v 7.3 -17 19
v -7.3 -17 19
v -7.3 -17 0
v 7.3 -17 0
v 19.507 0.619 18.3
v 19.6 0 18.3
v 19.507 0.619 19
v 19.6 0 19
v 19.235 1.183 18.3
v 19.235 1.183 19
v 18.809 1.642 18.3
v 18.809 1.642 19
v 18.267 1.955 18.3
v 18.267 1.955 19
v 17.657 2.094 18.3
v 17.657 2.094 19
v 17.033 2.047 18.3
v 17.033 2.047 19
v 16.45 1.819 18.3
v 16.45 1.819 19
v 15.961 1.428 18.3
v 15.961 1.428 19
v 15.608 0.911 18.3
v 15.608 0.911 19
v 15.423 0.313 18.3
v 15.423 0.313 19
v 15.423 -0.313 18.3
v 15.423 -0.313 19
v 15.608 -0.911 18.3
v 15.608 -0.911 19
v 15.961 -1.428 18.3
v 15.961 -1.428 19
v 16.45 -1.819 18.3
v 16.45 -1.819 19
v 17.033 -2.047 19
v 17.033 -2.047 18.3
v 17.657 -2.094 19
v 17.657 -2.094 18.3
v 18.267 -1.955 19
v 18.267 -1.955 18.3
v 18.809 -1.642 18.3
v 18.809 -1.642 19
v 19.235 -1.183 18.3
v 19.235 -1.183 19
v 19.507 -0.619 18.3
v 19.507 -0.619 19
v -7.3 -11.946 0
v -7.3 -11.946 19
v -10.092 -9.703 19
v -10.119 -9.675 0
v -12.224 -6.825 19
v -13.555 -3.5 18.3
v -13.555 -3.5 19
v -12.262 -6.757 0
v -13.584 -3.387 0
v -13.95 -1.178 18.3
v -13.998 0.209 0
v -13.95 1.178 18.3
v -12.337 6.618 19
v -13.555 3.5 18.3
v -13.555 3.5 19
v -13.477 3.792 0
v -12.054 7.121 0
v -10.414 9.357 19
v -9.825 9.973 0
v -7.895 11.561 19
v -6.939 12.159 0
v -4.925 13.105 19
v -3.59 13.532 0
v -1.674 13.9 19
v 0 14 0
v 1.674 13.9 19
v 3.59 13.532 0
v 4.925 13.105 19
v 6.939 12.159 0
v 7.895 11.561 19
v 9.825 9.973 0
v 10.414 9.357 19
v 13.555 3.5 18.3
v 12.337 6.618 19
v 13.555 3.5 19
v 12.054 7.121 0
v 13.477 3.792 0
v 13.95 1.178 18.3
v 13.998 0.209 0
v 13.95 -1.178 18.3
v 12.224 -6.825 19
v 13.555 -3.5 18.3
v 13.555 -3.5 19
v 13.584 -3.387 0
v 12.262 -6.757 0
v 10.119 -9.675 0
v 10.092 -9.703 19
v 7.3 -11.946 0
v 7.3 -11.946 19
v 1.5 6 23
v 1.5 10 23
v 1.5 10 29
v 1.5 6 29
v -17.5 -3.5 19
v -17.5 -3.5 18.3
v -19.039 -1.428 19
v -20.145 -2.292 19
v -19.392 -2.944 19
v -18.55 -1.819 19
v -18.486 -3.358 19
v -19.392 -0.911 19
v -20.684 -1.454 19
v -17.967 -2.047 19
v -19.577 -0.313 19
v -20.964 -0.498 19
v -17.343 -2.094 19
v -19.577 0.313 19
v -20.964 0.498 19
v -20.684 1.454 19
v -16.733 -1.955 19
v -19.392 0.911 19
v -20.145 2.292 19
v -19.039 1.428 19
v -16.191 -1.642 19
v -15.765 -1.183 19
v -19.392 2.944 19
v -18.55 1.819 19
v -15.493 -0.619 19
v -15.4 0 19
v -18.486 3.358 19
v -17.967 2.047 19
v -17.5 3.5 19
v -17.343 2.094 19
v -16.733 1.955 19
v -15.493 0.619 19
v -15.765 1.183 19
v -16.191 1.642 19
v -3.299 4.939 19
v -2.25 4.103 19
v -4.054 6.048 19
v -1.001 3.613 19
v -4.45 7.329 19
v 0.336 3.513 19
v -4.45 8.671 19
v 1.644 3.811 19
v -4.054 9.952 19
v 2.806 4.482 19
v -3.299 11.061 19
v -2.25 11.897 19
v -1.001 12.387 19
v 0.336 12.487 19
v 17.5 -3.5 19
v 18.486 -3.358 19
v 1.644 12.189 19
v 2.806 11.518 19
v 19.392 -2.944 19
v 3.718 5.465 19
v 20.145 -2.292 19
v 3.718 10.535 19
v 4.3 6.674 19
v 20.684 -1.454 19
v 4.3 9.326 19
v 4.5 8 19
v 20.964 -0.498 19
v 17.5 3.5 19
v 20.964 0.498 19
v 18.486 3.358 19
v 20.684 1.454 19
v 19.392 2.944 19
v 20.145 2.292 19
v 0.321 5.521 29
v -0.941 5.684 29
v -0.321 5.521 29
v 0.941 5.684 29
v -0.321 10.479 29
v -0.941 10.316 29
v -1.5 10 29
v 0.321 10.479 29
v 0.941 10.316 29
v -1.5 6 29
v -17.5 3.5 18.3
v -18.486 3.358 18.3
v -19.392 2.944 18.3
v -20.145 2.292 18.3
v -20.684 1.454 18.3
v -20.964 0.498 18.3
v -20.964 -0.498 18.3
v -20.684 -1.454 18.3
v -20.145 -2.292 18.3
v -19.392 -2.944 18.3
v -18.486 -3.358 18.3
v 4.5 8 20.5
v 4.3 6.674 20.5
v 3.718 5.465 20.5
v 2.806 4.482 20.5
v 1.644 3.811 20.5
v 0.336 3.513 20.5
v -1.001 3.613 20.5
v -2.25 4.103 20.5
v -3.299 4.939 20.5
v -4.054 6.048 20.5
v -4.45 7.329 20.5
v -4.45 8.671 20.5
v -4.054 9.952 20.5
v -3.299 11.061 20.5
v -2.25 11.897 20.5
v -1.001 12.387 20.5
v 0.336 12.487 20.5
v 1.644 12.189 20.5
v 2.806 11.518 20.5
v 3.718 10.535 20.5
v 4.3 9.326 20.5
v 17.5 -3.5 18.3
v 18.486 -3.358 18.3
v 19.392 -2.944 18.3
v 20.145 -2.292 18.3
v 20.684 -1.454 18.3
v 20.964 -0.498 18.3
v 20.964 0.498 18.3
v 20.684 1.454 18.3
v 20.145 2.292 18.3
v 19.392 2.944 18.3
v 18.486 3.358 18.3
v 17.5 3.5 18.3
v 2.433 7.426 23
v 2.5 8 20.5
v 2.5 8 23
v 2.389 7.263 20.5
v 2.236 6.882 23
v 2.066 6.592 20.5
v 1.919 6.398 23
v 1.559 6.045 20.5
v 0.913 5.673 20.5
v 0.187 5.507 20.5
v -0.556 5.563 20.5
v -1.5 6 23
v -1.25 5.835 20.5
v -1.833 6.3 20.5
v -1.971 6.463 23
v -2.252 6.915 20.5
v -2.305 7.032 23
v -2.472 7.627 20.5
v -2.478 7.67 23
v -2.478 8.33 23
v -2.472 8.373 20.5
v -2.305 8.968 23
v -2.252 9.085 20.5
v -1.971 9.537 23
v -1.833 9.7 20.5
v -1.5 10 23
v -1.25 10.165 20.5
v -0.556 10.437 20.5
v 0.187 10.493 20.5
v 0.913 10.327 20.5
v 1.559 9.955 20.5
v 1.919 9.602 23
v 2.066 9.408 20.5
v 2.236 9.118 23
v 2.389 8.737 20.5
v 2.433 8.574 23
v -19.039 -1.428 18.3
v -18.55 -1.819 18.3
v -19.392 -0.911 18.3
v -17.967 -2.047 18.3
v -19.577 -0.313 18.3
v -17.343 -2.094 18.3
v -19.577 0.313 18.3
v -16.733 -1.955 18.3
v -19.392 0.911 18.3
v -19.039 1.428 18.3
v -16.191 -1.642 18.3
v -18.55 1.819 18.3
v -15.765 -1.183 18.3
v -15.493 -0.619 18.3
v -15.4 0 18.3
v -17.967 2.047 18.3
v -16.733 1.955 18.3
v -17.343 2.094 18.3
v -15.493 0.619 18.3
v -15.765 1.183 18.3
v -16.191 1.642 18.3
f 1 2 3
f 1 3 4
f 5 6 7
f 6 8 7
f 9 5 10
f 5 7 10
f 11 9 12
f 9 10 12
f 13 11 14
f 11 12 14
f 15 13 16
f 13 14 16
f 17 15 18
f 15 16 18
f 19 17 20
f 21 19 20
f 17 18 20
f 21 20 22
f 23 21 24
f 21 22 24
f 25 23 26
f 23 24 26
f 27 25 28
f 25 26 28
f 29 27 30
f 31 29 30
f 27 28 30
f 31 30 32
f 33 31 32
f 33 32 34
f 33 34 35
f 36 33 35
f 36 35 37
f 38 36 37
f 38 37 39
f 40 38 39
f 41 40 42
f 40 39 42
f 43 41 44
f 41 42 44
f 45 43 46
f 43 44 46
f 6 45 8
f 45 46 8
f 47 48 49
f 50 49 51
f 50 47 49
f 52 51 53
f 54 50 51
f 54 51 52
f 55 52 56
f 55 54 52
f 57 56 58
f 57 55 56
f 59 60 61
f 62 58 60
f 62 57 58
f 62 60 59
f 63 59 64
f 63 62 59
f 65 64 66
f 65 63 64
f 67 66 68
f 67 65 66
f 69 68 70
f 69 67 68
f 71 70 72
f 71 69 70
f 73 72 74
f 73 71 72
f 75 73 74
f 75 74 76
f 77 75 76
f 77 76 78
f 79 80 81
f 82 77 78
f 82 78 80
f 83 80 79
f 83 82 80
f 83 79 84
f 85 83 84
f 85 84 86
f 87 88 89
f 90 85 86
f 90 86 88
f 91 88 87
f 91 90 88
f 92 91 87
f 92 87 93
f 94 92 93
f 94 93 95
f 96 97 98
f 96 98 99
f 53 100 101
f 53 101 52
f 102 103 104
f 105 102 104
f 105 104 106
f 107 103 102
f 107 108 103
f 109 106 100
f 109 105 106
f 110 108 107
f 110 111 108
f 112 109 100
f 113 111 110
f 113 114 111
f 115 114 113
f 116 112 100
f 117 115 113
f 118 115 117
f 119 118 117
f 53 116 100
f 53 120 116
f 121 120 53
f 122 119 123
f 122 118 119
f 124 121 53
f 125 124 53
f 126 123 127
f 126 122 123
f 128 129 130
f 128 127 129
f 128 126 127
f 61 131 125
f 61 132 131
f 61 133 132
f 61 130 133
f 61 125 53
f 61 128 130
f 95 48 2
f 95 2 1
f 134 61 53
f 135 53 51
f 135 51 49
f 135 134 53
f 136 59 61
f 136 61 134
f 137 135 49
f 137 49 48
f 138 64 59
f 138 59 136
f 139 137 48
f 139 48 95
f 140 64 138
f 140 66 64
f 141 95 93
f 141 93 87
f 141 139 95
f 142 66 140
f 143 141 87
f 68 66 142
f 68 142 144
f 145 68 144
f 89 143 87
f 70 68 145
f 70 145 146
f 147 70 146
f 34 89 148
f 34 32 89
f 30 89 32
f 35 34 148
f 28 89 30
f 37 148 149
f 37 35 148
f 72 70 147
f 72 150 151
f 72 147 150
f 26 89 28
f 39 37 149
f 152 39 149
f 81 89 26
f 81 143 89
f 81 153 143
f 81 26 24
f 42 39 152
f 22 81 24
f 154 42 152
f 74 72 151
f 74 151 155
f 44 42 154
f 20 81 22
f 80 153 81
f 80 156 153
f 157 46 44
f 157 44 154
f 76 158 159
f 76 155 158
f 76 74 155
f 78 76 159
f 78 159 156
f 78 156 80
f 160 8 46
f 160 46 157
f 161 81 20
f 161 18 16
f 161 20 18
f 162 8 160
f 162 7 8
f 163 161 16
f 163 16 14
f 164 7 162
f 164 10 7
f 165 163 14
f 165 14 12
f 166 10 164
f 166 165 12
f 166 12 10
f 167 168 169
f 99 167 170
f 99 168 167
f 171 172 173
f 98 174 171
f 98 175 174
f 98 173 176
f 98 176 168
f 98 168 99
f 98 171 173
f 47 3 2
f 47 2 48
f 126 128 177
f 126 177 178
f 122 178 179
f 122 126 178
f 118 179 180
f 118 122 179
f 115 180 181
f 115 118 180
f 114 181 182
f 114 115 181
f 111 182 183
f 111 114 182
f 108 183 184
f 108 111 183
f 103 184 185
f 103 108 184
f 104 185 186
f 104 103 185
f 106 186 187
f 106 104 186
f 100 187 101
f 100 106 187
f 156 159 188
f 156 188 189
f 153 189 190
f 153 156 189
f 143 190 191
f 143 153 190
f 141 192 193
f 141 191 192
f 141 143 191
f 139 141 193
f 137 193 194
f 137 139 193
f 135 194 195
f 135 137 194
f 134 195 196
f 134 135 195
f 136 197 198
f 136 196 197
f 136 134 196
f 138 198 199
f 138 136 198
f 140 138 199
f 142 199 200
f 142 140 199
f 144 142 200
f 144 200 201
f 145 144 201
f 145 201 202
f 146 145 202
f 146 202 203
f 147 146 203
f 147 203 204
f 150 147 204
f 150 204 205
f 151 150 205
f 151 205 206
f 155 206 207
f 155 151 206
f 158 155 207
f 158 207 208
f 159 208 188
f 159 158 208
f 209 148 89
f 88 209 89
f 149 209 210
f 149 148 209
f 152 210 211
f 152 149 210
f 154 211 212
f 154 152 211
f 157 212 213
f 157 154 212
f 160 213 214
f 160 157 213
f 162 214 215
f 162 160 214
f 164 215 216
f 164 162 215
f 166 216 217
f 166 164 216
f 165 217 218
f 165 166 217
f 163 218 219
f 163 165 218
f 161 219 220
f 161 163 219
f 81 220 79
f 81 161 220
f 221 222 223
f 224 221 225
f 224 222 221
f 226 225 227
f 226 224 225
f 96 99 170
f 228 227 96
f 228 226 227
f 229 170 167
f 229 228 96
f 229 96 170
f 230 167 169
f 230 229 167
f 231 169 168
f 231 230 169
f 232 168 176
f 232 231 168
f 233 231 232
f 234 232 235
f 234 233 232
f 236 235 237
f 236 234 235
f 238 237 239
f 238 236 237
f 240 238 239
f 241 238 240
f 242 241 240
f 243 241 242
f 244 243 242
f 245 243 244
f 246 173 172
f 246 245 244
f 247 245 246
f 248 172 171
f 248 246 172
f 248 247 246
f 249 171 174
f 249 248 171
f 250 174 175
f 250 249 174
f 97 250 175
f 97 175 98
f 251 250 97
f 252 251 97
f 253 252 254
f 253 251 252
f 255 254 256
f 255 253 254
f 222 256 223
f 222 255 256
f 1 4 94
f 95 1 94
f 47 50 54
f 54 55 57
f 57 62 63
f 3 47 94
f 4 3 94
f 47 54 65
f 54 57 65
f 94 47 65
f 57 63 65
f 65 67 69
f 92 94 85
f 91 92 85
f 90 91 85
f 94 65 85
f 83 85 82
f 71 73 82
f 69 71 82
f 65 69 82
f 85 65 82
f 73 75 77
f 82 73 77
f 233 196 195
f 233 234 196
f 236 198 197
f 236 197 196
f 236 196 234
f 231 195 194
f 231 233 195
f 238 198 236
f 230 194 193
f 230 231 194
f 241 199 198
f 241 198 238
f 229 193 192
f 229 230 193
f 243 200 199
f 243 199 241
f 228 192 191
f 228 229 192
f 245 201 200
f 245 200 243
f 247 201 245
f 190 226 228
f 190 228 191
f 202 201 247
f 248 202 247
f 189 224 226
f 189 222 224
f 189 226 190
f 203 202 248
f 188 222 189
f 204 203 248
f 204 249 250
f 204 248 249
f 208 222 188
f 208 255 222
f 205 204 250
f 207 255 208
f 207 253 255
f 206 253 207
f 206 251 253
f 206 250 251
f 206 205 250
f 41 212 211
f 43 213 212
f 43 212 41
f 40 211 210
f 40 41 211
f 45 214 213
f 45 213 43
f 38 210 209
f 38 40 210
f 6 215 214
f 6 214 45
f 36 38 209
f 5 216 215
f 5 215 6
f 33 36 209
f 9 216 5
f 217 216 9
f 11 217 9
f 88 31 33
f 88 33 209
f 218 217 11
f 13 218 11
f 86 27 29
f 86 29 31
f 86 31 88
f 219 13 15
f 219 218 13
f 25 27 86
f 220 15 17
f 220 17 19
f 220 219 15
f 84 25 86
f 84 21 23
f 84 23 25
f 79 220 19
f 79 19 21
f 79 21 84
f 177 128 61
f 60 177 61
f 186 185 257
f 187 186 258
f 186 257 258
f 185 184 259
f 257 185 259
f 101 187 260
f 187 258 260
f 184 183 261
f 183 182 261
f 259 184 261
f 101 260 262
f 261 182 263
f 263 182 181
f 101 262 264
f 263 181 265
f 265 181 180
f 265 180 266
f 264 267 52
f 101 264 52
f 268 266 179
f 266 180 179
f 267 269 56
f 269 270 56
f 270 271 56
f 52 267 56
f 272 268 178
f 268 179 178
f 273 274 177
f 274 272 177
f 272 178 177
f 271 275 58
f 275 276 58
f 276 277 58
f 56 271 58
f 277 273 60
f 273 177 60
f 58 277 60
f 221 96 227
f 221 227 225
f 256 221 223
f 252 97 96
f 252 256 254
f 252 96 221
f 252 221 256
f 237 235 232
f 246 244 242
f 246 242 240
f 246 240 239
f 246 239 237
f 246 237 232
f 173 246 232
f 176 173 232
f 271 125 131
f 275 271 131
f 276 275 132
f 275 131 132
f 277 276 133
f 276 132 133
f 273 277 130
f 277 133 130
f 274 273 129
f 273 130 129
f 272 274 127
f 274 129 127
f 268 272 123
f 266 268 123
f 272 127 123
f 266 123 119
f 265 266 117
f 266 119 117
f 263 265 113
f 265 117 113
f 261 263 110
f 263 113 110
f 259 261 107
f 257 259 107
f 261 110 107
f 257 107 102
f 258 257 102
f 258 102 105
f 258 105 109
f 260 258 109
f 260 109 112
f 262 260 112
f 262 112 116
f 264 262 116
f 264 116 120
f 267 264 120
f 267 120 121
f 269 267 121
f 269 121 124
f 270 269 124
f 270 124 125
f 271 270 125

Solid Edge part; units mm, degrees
sketch "Sketch1" plane through (0, 0, 0) normal (0, 0, 1) x (1, 0, 0)
  circle A0 centre (0, 0) radius 14
extrude "Protrusion1" add sketch "Sketch1" along normal blind 19
sketch "Sketch2" plane through (0, 0, 19) normal (0, 0, 1) x (1, 0, 0)
  line L0 (-17.5, -3.5) -> (-13.5554, -3.5)
  arc A0 (-13.5554, -3.5) -> (-13.5554, 3.5) centre (0, 0) cw
  line L1 (-17.5, 3.5) -> (-13.5554, 3.5)
  arc A1 (-17.5, -3.5) -> (-17.5, 3.5) centre (-17.5, 0) cw
  circle A2 centre (-17.5, 0) radius 2.1
  circle A3 centre (17.5, 0) radius 2.1
  line L2 (17.5, -3.5) -> (13.5554, -3.5)
  line L3 (17.5, 3.5) -> (13.5554, 3.5)
  arc A4 (17.5, 3.5) -> (17.5, -3.5) centre (17.5, 0) cw
  arc A5 (13.5554, 3.5) -> (13.5554, -3.5) centre (0, 0) cw
extrude "ExtrudedProtrusion_2" add sketch "Sketch2" against normal blind 0.7
sketch "Sketch3" plane through (0, 0, 19) normal (0, 0, 1) x (1, 0, 0)
  circle A0 centre (0, 8) radius 4.5
extrude "ExtrudedProtrusion_3" add sketch "Sketch3" along normal blind 1.5
sketch "Sketch4" plane through (0, 8, 20.5) normal (0, 0, 1) x (1, 0, 0)
  circle A0 centre (0, 0) radius 2.5
extrude "ExtrudedProtrusion_4" add sketch "Sketch4" along normal blind 2.5
sketch "Sketch5" plane through (0, 8, 23) normal (0, 0, 1) x (1, 0, 0)
  line L0 (-1.5, 2) -> (-1.5, -2)
  line L1 (1.5, 2) -> (1.5, -2)
  arc A0 (-1.5, 2) -> (1.5, 2) centre (0, 0) cw
  arc A1 (1.5, -2) -> (-1.5, -2) centre (0, 0) cw
extrude "ExtrudedProtrusion_5" add sketch "Sketch5" along normal blind 6
sketch "Sketch6" plane through (0, 0, 19) normal (0, 0, 1) x (1, 0, 0)
  line L0 (-7.3, -17) -> (7.3, -17)
  line L1 (7.3, -17) -> (7.3, -11.9461)
  line L2 (-7.3, -17) -> (-7.3, -11.9461)
  arc A0 (7.3, -11.9461) -> (-7.3, -11.9461) centre (0, 0) cw
extrude "Protrusion2" add sketch "Sketch6" against normal up to vertex (19 mm away)
